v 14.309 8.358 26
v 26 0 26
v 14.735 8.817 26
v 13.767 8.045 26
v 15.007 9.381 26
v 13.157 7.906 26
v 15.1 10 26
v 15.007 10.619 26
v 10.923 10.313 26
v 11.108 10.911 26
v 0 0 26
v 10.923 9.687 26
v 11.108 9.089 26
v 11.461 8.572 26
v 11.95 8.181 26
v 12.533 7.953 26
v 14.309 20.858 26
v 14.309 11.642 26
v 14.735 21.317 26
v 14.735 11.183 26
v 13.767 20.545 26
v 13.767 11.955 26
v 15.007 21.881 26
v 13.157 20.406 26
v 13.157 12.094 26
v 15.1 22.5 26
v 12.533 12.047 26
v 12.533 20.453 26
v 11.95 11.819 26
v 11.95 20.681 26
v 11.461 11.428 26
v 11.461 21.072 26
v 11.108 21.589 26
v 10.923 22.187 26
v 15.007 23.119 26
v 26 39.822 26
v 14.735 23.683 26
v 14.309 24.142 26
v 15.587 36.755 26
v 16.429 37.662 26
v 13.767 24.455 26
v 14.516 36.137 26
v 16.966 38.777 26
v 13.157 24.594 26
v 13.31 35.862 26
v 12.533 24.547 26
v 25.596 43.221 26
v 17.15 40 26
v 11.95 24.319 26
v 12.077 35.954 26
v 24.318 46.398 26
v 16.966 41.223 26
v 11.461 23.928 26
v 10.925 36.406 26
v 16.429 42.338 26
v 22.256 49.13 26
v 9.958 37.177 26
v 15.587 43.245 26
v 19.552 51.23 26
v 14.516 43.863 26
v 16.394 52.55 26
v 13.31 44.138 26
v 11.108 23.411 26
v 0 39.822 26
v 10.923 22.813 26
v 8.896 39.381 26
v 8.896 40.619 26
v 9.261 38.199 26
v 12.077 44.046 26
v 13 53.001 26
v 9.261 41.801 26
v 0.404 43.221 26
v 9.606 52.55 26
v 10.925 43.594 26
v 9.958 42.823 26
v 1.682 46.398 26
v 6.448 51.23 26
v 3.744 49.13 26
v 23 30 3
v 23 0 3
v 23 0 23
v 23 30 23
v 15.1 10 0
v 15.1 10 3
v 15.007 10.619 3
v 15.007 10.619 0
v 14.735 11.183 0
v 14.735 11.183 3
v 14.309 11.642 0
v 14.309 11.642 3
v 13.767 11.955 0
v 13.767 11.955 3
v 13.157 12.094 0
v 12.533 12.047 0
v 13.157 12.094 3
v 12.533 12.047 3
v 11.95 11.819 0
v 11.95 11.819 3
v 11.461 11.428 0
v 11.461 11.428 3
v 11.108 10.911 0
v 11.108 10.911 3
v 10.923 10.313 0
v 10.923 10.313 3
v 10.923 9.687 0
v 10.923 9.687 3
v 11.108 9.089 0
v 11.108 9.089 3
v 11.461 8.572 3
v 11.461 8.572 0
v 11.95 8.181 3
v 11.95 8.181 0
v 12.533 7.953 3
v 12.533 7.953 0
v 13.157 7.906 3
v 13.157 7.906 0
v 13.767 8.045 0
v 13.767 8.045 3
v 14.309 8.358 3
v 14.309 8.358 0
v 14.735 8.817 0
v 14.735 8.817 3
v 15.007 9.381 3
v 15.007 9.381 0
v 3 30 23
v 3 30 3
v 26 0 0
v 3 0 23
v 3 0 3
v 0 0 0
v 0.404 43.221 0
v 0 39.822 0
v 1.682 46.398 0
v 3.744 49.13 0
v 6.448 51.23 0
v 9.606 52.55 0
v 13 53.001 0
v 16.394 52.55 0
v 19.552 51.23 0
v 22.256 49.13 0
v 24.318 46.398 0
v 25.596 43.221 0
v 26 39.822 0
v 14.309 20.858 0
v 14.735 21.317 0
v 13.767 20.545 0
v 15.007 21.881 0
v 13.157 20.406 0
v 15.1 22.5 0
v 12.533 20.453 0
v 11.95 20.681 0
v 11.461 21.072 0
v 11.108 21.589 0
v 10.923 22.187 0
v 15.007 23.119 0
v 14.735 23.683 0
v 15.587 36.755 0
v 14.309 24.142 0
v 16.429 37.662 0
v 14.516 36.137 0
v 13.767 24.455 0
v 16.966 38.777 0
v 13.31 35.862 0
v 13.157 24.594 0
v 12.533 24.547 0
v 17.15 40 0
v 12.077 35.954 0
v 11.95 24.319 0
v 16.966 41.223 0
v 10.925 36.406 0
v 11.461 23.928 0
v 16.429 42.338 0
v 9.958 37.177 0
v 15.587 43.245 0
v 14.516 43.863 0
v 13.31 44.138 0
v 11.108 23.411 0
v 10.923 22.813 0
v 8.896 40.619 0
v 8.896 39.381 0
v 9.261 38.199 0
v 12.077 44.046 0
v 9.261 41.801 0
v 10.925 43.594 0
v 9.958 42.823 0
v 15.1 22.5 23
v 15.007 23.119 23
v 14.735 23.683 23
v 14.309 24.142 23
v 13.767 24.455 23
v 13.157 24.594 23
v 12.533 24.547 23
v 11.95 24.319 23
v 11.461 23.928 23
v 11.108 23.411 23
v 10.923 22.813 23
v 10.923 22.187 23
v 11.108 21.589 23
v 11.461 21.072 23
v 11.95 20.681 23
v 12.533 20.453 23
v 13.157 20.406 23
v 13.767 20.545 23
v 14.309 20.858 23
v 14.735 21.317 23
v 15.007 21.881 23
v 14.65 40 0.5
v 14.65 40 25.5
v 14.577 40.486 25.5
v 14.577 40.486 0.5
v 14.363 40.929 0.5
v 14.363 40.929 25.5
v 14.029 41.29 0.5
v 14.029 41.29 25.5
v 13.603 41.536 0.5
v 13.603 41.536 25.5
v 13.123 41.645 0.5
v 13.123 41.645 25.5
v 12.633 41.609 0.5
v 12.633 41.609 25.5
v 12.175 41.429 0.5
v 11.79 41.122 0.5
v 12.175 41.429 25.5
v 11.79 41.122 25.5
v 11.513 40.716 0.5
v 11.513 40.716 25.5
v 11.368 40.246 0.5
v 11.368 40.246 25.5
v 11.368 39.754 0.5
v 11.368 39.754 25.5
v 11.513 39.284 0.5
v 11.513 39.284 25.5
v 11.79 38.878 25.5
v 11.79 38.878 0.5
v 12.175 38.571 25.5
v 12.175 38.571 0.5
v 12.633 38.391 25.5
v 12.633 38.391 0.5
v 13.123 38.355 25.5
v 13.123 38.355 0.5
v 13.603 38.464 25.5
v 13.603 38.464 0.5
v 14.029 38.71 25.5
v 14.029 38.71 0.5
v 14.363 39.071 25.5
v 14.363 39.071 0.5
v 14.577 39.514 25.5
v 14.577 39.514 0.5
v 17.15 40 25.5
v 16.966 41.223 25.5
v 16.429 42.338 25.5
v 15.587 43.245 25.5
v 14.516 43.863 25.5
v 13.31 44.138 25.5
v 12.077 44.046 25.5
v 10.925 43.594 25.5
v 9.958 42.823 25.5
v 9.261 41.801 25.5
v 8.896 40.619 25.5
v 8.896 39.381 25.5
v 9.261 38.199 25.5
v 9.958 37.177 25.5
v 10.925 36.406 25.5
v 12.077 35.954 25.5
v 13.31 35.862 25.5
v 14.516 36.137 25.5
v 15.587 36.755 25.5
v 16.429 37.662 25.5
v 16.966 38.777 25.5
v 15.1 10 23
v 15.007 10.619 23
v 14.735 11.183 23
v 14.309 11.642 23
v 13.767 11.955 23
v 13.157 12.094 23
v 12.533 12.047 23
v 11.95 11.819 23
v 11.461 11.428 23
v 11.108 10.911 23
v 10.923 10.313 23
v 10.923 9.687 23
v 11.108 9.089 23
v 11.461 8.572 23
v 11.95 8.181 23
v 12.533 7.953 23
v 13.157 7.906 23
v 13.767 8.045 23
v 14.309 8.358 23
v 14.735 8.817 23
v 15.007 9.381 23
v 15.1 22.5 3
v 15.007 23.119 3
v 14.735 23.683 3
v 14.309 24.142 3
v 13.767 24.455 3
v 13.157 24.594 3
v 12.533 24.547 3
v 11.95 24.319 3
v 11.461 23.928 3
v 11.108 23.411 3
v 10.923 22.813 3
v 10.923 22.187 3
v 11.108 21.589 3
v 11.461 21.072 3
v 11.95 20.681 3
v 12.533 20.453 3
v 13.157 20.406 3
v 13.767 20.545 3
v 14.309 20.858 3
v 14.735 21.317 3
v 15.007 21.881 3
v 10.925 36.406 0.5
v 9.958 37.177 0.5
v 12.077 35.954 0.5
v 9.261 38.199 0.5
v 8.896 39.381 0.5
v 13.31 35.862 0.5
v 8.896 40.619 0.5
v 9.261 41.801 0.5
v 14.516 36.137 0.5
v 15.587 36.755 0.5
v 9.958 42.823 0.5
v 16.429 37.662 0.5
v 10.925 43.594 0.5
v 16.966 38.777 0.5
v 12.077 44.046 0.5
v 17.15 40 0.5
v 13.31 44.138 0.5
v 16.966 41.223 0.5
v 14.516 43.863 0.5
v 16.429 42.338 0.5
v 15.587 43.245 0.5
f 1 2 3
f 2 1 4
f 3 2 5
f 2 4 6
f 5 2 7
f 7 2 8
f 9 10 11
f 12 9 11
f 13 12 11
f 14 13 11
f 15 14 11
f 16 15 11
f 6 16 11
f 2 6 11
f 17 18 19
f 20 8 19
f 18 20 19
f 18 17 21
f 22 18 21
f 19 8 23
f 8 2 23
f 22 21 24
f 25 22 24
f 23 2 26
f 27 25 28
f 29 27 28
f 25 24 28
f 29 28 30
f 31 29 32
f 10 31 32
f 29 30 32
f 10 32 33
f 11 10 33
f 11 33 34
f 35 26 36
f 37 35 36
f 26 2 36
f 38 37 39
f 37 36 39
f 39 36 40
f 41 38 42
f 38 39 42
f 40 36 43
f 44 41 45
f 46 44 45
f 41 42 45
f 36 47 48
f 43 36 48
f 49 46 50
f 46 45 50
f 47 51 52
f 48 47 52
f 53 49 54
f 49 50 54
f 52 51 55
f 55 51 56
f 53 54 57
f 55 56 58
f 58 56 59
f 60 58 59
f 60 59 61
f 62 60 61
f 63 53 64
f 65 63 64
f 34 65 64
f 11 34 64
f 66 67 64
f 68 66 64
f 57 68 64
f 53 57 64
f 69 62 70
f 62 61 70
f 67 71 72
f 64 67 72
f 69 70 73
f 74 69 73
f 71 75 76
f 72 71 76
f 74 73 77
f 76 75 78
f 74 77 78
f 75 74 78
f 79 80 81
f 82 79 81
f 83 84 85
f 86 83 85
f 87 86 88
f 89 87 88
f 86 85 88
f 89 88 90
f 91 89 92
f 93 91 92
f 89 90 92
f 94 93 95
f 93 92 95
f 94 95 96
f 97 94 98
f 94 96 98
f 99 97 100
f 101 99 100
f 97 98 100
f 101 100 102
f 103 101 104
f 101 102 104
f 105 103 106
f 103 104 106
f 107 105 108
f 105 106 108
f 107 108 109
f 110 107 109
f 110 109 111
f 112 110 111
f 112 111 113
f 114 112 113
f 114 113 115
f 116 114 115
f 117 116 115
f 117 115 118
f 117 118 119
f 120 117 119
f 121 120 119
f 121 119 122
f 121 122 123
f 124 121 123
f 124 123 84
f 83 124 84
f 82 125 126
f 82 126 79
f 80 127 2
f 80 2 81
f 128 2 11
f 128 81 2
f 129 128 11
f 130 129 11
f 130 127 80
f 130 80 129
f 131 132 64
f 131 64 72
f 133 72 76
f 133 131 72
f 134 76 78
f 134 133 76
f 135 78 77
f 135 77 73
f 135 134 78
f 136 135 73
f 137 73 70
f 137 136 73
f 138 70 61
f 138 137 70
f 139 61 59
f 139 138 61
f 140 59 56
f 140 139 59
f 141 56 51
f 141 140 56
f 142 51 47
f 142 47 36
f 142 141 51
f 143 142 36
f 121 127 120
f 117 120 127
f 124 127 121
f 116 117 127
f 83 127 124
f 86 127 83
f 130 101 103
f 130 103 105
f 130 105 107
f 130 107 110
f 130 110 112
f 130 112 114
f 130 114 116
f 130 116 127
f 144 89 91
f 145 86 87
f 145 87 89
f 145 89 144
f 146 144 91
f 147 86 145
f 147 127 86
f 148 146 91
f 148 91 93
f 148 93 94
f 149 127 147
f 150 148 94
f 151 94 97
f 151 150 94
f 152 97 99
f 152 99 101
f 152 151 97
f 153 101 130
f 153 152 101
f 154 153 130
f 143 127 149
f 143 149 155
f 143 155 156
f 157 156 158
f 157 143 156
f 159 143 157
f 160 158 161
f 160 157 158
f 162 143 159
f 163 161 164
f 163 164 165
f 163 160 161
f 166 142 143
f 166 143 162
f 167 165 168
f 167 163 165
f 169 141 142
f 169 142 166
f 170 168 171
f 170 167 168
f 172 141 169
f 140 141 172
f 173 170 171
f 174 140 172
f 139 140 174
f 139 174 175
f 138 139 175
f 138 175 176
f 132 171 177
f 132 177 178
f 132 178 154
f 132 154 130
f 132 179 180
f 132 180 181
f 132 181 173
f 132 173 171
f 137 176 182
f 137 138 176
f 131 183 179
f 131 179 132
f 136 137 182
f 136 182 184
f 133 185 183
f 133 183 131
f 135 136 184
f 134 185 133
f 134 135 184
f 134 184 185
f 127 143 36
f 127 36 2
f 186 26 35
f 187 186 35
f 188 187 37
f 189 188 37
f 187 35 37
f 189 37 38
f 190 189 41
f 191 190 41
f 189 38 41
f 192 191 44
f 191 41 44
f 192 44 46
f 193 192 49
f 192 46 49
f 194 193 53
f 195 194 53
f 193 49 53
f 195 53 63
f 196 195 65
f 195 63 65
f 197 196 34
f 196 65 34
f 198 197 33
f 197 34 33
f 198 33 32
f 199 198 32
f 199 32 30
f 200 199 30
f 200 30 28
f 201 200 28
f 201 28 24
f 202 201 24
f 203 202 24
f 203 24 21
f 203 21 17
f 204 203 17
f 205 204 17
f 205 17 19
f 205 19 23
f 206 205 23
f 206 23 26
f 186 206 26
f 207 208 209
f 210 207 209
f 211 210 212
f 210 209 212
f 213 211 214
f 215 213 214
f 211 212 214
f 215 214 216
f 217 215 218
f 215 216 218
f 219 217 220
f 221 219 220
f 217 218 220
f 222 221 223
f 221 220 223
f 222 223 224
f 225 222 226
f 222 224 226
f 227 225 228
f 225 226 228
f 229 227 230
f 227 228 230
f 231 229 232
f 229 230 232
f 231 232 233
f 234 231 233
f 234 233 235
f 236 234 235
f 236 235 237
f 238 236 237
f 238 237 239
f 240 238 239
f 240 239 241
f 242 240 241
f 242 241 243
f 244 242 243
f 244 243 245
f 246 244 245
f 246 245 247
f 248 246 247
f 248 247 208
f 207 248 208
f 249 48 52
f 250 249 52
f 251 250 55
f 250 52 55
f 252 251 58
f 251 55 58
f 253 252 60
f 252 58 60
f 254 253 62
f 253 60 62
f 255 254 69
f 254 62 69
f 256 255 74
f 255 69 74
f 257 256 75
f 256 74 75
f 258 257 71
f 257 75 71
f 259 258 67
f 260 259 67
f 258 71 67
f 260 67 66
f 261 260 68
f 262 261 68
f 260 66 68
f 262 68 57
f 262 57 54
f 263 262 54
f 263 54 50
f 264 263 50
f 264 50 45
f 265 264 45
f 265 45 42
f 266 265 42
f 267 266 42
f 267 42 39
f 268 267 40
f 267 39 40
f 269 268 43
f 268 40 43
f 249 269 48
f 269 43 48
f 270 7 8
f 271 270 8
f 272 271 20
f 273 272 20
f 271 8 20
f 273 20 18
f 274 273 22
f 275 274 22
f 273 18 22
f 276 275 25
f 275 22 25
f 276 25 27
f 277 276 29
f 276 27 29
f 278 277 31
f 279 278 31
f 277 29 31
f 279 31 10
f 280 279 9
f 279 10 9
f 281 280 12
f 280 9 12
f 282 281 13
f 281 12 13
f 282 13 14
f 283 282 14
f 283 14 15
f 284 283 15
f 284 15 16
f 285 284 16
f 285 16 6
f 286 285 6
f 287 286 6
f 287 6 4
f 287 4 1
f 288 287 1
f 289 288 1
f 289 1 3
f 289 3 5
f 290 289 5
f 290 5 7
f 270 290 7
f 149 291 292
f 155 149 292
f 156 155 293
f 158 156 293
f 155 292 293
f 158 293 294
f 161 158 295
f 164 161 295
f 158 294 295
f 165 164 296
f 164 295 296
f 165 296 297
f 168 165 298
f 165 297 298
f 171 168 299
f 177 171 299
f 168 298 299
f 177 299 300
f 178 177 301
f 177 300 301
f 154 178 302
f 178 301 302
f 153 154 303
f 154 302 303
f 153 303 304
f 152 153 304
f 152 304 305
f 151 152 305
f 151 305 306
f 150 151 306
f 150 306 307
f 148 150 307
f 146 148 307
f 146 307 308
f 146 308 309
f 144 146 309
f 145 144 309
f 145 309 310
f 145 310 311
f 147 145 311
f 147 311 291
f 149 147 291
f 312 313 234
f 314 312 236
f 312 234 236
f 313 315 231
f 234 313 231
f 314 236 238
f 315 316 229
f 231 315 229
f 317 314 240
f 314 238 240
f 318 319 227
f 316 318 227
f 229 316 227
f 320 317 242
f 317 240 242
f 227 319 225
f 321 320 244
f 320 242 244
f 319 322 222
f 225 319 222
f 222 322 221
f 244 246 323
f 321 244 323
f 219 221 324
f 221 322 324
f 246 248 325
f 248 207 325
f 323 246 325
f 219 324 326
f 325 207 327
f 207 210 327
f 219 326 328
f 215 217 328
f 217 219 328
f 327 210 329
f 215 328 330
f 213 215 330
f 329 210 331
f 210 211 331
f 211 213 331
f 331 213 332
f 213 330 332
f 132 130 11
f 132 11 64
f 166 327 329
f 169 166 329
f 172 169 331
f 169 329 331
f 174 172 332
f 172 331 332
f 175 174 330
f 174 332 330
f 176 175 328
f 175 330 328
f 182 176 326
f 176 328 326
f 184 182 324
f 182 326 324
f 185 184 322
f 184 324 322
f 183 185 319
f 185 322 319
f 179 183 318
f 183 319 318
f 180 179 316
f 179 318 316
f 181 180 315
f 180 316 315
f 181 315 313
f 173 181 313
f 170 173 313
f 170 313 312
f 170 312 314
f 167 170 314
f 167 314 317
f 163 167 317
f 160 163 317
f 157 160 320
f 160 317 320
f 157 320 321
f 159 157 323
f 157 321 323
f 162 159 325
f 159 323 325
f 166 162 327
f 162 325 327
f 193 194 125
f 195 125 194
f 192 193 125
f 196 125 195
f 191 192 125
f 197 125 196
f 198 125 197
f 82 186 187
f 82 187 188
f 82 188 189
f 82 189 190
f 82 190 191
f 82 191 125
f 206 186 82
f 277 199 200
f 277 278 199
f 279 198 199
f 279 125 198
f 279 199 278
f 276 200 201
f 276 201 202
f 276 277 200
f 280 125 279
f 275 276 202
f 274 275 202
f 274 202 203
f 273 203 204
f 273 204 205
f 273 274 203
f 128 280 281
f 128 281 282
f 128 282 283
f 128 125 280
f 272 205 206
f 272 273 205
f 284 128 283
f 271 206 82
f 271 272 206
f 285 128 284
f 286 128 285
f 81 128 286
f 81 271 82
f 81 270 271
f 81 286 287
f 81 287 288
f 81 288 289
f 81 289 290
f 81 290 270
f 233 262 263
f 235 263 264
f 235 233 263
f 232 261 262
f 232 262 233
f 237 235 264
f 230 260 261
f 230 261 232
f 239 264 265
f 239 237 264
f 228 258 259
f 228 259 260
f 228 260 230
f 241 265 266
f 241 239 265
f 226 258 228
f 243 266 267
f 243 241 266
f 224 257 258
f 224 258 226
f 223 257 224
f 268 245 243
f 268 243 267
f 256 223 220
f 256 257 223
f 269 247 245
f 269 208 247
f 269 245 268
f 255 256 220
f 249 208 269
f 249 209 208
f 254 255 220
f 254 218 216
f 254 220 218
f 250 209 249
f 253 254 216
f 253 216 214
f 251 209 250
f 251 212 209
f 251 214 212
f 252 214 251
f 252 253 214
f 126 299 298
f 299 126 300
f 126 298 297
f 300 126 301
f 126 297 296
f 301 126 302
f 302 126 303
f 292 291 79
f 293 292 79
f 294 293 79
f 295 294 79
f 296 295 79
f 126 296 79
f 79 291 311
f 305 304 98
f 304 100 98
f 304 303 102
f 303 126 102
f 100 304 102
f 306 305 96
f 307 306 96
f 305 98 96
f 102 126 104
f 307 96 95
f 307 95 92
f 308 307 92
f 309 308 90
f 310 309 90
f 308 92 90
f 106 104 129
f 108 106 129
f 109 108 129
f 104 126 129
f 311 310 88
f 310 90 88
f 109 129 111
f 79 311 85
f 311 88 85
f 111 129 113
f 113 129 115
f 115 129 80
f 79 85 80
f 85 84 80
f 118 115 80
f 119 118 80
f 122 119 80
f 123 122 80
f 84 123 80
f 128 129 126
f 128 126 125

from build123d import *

# Parameters (mm, degrees)
EXTRUDE_1_DEPTH     = 26
SKETCH_3_W          = 20
SKETCH_3_H          = 20
CUT_EXTRUDE_1_DEPTH = 30
SKETCH_4_R          = 1.65
CUT_EXTRUDE_2_DEPTH = 69.713384893
SKETCH_4_3_R        = 4.15
SKETCH_4_3_R_2      = 1.65
CUT_EXTRUDE_3_DEPTH = 0.5
CUT_EXTRUDE_START   = -25.5
SKETCH_4_4_R        = 4.15
SKETCH_4_4_R_2      = 1.65
CUT_EXTRUDE_4_DEPTH = 0.5
SKETCH_5_R          = 2.1
CUT_EXTRUDE_5_DEPTH = 69.713384893
CUT_EXTRUDE_START_2 = -67
CUT_EXTRUDE_6_DEPTH = 67


with BuildPart() as part:
    # 草图2 → 凸台-拉伸1 (new body)
    with BuildSketch(Plane.XY):
        with BuildLine():
            Line((0, 0), (0, 30))
            ThreePointArc((0, 30), (13, 56.401219467), (26, 30))
            Line((26, 30), (26, 0))
            Line((26, 0), (0, 0))
        make_face()
    extrude(amount=EXTRUDE_1_DEPTH)

    # 草图3 → 切除-拉伸1 (cut)
    with BuildSketch(Plane.XZ):
        with Locations((13, 13)):
            Rectangle(SKETCH_3_W, SKETCH_3_H)
    extrude(amount=-CUT_EXTRUDE_1_DEPTH, mode=Mode.SUBTRACT)

    # 草图4 → 切除-拉伸2 (cut, through all)
    with BuildSketch(Plane.XY.offset(26)):
        with Locations((13, 40)):
            Circle(SKETCH_4_R)
    extrude(amount=-CUT_EXTRUDE_2_DEPTH, mode=Mode.SUBTRACT)

    # 草图4<3> → 切除-拉伸3 (cut)
    with BuildSketch(Plane.XY.offset(26)):
        with Locations((13, 40)):
            Circle(SKETCH_4_3_R)
        with Locations((13, 40)):
            Circle(SKETCH_4_3_R_2, mode=Mode.SUBTRACT)
    extrude(amount=-CUT_EXTRUDE_3_DEPTH, mode=Mode.SUBTRACT)

    # 草图4<4> → 切除-拉伸4 (cut)
    with BuildSketch(Plane.XY.offset(26).offset(CUT_EXTRUDE_START)):
        with Locations((13, 40)):
            Circle(SKETCH_4_4_R)
        with Locations((13, 40)):
            Circle(SKETCH_4_4_R_2, mode=Mode.SUBTRACT)
    extrude(amount=-CUT_EXTRUDE_4_DEPTH, mode=Mode.SUBTRACT)

    # 草图5 → 切除-拉伸5 (cut, through all)
    with BuildSketch(Plane.XY.offset(26)):
        with Locations((13, 22.5)):
            Circle(SKETCH_5_R)
        with Locations((13, 10)):
            Circle(SKETCH_5_R)
    extrude(amount=-CUT_EXTRUDE_5_DEPTH, mode=Mode.SUBTRACT)

    # 草图6 → 切除-拉伸6 (cut)
    with BuildSketch(Plane.XY.offset(26).offset(CUT_EXTRUDE_START_2)):
        with BuildLine():
            Line((0, 30), (0, 39.821933649))
            ThreePointArc((0, 39.821933649), (13, 53.001219467), (26, 39.821933649))
            Line((26, 39.821933649), (26, 30))
            ThreePointArc((26, 30), (13, 56.401219467), (0, 30))
        make_face()
    extrude(amount=CUT_EXTRUDE_6_DEPTH, mode=Mode.SUBTRACT)


solid = part.part
